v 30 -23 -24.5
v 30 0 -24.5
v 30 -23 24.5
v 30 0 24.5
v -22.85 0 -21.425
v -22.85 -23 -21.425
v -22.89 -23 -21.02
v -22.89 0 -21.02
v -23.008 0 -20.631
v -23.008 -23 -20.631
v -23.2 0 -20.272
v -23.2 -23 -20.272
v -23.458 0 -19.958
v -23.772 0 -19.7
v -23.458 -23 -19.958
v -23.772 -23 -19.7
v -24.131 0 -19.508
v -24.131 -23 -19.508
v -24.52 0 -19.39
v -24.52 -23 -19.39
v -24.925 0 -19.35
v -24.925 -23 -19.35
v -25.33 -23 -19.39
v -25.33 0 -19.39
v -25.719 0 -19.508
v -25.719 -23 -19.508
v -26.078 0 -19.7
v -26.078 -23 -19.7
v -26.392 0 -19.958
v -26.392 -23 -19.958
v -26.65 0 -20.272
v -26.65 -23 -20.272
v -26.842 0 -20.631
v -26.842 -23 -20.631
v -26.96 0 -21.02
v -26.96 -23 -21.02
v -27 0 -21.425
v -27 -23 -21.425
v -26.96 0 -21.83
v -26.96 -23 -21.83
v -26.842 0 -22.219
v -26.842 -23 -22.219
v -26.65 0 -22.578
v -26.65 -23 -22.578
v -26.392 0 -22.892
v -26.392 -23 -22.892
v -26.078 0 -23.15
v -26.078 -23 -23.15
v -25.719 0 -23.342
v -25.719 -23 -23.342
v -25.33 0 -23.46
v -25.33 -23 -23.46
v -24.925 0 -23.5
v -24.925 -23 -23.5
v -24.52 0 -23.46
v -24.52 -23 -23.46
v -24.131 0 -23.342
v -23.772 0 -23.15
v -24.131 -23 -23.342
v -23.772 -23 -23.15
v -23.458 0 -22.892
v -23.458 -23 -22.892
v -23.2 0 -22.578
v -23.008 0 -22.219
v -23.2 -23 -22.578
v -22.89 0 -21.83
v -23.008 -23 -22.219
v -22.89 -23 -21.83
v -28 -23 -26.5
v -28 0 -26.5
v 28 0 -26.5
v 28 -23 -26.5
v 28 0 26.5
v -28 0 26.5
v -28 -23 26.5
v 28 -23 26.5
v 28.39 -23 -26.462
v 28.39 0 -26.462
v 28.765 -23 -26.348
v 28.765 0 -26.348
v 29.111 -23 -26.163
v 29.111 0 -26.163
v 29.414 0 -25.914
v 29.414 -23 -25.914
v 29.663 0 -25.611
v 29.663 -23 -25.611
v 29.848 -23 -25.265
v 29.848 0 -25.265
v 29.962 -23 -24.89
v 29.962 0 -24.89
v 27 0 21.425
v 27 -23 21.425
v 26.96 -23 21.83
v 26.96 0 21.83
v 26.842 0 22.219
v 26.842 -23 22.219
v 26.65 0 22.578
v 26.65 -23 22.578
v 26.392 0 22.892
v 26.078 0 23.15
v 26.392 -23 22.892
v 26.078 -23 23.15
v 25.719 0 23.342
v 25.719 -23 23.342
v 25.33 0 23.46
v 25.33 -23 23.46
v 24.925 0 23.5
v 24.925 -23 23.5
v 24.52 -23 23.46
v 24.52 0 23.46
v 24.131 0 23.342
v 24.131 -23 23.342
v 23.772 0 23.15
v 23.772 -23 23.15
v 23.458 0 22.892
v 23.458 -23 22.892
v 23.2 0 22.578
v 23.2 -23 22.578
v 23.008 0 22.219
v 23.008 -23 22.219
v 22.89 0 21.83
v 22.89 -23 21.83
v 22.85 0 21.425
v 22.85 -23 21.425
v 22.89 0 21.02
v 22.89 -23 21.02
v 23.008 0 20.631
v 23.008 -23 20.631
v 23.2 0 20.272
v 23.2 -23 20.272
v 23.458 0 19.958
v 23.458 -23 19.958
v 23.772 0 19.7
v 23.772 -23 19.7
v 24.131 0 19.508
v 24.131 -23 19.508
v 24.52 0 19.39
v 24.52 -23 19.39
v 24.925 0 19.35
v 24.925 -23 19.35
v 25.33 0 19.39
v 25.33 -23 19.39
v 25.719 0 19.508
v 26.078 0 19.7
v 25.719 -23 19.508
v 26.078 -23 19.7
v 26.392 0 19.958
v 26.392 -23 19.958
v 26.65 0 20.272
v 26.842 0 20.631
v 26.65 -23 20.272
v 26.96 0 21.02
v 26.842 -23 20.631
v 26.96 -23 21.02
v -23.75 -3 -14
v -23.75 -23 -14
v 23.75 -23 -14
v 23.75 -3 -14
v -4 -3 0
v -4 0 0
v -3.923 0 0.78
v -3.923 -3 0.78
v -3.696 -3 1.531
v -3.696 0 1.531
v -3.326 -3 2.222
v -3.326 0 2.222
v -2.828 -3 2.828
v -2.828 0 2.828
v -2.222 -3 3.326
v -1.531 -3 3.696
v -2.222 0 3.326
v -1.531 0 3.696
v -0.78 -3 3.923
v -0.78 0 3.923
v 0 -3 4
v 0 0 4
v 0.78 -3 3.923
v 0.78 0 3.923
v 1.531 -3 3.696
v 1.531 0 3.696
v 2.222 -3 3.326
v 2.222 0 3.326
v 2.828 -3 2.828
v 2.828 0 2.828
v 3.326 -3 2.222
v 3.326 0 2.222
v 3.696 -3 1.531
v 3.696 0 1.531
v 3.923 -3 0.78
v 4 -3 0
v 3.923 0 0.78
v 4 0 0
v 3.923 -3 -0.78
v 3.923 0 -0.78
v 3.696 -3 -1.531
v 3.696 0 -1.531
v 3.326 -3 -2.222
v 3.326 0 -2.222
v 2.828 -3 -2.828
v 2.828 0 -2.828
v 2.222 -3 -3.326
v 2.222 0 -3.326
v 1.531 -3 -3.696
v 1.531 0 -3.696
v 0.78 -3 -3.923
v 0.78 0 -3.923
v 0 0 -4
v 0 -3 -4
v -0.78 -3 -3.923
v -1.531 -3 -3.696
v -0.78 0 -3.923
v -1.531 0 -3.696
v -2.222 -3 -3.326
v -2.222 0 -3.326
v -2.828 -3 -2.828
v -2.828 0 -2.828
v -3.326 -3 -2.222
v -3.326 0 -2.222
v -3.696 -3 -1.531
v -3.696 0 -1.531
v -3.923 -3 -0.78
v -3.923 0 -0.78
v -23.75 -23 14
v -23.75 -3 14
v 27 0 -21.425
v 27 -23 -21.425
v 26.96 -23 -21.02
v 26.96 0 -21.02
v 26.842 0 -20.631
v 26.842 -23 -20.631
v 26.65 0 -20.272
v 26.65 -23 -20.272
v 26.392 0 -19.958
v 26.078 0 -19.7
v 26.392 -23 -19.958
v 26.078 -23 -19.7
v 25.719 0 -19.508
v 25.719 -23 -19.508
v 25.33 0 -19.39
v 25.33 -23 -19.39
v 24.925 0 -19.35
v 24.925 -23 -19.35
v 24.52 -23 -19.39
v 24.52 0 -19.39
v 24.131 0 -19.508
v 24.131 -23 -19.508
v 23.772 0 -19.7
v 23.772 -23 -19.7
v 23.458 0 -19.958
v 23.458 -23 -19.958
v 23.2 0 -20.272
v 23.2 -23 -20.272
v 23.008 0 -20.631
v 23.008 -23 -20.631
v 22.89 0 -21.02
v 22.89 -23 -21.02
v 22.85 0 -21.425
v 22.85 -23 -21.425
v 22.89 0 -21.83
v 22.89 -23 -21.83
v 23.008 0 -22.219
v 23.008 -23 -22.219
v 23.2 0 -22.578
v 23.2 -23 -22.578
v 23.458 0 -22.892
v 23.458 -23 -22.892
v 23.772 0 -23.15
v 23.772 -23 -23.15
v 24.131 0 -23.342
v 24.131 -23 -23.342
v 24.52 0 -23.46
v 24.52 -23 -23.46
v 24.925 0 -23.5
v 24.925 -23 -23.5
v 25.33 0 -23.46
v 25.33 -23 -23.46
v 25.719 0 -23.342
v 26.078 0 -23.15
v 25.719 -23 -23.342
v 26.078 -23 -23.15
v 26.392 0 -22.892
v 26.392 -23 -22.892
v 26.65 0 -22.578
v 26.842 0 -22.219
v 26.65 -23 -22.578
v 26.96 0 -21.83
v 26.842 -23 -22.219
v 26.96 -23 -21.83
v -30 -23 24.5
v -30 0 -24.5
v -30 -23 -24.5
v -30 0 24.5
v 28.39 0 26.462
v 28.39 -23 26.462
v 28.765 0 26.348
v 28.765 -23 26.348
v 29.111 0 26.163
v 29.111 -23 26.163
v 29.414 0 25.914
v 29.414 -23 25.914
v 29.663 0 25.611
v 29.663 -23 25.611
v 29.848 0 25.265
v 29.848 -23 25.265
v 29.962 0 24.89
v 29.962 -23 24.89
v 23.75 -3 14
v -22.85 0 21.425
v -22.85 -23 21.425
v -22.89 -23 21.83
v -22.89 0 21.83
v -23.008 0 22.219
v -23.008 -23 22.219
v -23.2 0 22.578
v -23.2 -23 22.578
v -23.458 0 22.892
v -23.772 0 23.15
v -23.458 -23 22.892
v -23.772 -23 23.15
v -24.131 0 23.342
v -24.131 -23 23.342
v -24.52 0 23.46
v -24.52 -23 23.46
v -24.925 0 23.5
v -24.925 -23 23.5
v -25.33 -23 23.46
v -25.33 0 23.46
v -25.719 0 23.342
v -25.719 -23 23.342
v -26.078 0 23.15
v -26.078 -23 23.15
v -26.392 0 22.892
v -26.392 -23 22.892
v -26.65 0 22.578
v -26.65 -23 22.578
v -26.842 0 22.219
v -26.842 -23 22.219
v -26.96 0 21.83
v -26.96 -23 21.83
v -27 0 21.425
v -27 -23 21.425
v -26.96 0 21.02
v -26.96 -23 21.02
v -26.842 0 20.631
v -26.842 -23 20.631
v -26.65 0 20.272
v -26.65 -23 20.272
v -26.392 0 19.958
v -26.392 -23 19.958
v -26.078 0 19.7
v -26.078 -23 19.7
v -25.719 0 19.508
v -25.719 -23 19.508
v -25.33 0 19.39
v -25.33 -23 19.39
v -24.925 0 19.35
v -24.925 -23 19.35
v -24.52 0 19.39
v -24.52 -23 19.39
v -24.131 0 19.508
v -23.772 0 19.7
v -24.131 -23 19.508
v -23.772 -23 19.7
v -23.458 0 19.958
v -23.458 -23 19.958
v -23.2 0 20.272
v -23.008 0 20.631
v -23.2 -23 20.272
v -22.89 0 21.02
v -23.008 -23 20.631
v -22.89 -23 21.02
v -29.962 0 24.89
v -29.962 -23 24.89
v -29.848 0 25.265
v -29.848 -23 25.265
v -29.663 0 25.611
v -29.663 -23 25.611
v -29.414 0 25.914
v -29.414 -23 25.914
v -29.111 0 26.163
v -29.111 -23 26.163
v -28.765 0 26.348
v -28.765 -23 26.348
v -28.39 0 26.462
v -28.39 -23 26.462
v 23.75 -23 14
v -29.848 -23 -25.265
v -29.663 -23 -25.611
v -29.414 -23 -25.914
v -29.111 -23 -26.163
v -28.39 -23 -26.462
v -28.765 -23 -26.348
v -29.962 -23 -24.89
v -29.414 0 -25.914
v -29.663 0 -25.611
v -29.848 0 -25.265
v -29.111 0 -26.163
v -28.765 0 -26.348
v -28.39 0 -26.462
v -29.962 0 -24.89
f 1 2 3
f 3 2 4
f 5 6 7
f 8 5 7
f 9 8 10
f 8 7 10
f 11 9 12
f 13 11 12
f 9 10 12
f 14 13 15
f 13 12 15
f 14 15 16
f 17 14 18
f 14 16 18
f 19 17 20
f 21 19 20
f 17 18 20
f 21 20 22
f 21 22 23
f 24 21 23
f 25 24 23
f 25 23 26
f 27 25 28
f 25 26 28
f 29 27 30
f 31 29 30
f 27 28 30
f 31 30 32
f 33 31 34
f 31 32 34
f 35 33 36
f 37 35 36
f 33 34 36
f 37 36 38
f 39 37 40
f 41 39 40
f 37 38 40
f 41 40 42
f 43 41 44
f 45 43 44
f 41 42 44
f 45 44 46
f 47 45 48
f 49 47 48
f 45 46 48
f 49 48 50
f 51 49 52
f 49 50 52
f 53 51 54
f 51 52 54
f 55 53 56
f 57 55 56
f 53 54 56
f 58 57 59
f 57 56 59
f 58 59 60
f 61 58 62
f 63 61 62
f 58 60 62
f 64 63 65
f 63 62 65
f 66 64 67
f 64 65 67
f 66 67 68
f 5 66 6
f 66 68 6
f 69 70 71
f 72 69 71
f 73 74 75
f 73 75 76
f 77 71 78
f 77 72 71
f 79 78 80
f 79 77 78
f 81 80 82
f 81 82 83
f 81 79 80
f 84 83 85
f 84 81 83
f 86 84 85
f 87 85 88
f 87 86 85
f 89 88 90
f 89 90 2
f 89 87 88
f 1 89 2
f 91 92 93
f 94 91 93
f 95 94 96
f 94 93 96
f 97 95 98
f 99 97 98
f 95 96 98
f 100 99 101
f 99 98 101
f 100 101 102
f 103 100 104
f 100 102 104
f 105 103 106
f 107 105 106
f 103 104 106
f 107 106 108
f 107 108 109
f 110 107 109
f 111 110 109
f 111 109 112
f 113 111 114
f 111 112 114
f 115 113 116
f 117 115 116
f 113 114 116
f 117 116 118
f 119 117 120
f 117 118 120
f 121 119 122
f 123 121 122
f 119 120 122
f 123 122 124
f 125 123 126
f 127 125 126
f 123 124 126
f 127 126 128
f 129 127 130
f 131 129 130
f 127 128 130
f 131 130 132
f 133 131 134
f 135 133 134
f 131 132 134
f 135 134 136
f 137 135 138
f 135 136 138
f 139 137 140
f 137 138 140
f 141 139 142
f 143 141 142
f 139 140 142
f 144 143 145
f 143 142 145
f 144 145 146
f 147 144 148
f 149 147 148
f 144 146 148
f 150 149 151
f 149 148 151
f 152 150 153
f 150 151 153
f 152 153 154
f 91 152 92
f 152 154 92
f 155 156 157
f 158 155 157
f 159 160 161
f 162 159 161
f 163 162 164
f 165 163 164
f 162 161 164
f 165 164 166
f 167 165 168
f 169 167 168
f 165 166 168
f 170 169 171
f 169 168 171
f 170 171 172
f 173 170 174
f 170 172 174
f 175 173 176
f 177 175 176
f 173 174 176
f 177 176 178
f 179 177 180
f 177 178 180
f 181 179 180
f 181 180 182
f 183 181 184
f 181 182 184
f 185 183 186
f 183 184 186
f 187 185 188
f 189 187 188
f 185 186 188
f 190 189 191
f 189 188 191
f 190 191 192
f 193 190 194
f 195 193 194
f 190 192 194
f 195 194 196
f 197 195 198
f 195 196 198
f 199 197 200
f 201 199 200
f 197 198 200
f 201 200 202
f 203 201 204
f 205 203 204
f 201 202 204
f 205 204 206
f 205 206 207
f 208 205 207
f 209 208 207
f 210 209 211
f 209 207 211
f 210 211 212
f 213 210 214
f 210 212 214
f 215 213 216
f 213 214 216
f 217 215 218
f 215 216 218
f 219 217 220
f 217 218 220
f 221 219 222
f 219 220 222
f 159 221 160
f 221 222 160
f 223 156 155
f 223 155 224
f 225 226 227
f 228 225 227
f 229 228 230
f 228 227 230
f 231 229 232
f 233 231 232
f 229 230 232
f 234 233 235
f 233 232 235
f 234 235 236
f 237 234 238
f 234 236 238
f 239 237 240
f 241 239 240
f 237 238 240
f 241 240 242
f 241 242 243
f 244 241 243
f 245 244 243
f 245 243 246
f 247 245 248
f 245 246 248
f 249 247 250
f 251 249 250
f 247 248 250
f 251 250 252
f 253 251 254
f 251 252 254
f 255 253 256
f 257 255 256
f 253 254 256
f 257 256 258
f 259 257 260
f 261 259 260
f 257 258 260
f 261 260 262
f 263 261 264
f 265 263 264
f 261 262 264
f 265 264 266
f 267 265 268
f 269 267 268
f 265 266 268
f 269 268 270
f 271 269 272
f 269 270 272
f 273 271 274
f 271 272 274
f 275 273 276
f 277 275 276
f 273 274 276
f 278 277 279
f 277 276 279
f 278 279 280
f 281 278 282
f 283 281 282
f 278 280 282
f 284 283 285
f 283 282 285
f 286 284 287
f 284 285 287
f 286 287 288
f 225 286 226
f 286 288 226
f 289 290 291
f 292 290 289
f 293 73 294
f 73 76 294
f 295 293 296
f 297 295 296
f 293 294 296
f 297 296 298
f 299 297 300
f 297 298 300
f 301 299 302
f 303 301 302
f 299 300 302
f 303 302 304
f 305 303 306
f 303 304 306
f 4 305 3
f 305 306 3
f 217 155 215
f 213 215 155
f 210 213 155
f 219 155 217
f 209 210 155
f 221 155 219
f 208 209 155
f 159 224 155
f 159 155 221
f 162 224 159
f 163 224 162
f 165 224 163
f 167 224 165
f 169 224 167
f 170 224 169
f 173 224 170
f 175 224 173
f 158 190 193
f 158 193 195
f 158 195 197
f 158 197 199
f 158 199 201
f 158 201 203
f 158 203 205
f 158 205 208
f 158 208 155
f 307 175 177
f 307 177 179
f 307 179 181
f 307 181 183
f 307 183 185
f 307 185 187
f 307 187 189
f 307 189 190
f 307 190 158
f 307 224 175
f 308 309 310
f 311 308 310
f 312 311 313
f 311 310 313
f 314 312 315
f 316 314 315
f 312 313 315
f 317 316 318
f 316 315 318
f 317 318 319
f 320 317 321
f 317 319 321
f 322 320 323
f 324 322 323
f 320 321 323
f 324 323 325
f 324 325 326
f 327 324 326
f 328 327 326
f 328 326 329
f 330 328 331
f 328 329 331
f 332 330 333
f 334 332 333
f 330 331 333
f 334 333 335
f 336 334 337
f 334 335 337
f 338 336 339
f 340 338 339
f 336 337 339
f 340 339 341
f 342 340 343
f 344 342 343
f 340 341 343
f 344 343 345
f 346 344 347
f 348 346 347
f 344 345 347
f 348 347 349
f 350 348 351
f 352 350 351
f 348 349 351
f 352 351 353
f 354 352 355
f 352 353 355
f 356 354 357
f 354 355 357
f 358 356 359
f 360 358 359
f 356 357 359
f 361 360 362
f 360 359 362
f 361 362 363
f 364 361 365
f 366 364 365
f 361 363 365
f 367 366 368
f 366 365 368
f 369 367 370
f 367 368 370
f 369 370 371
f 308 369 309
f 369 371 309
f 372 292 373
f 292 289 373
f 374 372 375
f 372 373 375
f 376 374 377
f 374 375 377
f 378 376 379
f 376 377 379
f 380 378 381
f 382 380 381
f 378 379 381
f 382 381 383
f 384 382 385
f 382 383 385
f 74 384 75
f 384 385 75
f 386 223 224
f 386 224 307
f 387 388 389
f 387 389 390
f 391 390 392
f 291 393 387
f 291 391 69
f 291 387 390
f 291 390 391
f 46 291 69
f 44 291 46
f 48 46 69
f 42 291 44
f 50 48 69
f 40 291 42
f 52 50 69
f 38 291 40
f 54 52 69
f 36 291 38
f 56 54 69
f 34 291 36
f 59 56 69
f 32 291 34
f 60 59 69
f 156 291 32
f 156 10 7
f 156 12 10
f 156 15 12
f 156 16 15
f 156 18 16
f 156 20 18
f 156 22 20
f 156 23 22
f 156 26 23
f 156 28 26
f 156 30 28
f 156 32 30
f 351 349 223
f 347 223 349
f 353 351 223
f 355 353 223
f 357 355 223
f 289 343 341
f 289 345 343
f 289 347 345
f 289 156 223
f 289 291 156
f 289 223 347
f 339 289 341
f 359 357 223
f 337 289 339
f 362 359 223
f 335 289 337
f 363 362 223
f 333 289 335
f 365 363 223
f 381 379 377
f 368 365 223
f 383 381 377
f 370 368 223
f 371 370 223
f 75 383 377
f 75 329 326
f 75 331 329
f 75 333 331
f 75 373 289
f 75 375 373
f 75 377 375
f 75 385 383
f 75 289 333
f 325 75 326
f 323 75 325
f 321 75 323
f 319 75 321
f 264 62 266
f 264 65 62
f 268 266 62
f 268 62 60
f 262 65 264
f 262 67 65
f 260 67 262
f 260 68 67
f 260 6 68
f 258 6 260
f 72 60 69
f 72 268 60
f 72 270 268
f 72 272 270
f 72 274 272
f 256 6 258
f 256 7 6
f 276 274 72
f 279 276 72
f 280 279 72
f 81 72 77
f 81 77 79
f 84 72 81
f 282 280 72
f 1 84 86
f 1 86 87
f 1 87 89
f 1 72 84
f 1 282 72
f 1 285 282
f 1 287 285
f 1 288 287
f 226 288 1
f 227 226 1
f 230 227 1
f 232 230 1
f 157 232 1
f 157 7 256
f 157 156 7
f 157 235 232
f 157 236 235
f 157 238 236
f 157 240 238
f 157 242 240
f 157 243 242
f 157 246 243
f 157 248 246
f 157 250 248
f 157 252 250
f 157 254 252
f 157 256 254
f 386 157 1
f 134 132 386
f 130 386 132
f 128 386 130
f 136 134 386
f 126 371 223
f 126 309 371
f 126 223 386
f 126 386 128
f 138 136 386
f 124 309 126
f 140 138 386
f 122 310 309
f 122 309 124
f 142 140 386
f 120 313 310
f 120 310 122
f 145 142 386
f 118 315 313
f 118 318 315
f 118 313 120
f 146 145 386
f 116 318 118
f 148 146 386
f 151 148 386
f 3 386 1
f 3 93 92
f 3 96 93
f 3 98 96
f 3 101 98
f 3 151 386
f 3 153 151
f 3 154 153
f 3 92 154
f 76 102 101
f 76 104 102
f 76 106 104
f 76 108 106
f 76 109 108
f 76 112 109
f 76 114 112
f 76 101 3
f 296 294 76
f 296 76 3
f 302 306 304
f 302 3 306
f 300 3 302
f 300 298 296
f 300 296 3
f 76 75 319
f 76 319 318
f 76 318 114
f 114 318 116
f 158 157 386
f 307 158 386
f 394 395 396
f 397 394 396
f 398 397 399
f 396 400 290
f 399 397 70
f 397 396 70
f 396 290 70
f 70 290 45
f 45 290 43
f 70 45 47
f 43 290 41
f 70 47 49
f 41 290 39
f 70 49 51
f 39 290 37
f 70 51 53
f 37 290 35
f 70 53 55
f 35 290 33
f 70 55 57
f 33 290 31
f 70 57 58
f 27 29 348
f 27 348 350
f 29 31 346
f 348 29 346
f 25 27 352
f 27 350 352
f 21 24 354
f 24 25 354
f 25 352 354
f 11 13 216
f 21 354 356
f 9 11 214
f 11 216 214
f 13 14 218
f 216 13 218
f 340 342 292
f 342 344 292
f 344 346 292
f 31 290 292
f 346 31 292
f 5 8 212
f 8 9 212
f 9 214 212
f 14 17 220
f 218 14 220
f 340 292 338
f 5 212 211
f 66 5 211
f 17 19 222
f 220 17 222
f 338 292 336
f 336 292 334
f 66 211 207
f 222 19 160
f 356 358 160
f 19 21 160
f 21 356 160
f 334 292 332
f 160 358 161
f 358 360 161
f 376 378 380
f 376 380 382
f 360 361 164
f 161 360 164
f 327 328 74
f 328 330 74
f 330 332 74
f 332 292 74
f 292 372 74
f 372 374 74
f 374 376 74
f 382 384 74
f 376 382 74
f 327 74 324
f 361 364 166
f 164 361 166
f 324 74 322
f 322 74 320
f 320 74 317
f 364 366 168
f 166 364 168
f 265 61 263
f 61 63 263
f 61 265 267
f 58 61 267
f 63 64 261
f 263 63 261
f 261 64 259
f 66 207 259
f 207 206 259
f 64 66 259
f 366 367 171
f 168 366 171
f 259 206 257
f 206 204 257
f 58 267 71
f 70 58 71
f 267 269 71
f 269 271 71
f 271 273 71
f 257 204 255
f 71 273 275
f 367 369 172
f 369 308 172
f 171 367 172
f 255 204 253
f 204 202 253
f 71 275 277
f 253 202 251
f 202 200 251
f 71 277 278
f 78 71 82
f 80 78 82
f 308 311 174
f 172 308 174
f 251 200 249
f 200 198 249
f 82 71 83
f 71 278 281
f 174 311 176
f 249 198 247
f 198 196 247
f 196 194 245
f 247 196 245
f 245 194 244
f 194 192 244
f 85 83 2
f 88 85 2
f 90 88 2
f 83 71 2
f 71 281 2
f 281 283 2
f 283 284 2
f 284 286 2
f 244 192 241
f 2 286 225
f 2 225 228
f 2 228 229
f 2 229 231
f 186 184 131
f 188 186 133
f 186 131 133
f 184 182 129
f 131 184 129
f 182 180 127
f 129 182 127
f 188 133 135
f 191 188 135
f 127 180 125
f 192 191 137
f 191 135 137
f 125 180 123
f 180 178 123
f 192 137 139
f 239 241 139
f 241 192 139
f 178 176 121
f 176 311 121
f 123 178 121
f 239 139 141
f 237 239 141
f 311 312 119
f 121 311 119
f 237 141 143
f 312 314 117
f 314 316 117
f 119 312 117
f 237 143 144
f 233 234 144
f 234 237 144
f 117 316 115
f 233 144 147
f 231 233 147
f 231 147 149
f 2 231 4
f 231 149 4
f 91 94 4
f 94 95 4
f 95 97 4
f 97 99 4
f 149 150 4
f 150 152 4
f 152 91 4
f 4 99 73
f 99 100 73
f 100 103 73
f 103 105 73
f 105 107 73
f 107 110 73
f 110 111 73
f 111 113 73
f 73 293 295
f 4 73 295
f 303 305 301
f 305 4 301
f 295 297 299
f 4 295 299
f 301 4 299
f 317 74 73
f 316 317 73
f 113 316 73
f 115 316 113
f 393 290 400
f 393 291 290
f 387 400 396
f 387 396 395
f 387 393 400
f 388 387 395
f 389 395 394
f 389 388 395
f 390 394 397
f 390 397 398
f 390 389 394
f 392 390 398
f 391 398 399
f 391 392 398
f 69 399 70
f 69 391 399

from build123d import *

# Parameters (mm, degrees)
F0_W     = 60
F0_H     = 53
F1_DEPTH = 23
F2_W     = 47.5
F2_H     = 28
F3_DEPTH = 20
F4_R     = 2
F5_R     = 2
F6_R     = 4
F7_DEPTH = 3
F8_R     = 2.075
F9_DEPTH = 23


with BuildPart() as f1:
    # F0 (on Front) → F1 (new body)
    with BuildSketch(Plane.XZ):
        Rectangle(F0_W, F0_H)
    extrude(amount=F1_DEPTH)

    # F2 (on face) → F3 (cut)
    with BuildSketch(Plane.XZ.offset(23)):
        Rectangle(F2_W, F2_H)
    extrude(amount=-F3_DEPTH, mode=Mode.SUBTRACT)

    # F4
    f4_edges = [f1.edges().sort_by_distance(p)[0] for p in [
        (-30, -11.5, -26.5),
    ]]
    fillet(f4_edges, radius=F4_R)

    # F5
    f5_edges = [f1.edges().sort_by_distance(p)[0] for p in [
        (30, -11.5, -26.5),
        (30, -11.5, 26.5),
        (-30, -11.5, 26.5),
    ]]
    fillet(f5_edges, radius=F5_R)

    # F6 (on face) → F7 (cut)
    with BuildSketch(Plane(origin=(0, 0, 0), x_dir=(-1, 0, 0), z_dir=(0, 1, 0))):
        Circle(F6_R)
    extrude(amount=-F7_DEPTH, mode=Mode.SUBTRACT)

    # F8 (on face) → F9 (cut)
    with BuildSketch(Plane.XZ.offset(23)):
        with Locations((-24.925, 21.425)):
            Circle(F8_R)
        with Locations((24.925, 21.425)):
            Circle(F8_R)
        with Locations((24.925, -21.425)):
            Circle(F8_R)
        with Locations((-24.925, -21.425)):
            Circle(F8_R)
    extrude(amount=-F9_DEPTH, mode=Mode.SUBTRACT)


solid = f1.part
